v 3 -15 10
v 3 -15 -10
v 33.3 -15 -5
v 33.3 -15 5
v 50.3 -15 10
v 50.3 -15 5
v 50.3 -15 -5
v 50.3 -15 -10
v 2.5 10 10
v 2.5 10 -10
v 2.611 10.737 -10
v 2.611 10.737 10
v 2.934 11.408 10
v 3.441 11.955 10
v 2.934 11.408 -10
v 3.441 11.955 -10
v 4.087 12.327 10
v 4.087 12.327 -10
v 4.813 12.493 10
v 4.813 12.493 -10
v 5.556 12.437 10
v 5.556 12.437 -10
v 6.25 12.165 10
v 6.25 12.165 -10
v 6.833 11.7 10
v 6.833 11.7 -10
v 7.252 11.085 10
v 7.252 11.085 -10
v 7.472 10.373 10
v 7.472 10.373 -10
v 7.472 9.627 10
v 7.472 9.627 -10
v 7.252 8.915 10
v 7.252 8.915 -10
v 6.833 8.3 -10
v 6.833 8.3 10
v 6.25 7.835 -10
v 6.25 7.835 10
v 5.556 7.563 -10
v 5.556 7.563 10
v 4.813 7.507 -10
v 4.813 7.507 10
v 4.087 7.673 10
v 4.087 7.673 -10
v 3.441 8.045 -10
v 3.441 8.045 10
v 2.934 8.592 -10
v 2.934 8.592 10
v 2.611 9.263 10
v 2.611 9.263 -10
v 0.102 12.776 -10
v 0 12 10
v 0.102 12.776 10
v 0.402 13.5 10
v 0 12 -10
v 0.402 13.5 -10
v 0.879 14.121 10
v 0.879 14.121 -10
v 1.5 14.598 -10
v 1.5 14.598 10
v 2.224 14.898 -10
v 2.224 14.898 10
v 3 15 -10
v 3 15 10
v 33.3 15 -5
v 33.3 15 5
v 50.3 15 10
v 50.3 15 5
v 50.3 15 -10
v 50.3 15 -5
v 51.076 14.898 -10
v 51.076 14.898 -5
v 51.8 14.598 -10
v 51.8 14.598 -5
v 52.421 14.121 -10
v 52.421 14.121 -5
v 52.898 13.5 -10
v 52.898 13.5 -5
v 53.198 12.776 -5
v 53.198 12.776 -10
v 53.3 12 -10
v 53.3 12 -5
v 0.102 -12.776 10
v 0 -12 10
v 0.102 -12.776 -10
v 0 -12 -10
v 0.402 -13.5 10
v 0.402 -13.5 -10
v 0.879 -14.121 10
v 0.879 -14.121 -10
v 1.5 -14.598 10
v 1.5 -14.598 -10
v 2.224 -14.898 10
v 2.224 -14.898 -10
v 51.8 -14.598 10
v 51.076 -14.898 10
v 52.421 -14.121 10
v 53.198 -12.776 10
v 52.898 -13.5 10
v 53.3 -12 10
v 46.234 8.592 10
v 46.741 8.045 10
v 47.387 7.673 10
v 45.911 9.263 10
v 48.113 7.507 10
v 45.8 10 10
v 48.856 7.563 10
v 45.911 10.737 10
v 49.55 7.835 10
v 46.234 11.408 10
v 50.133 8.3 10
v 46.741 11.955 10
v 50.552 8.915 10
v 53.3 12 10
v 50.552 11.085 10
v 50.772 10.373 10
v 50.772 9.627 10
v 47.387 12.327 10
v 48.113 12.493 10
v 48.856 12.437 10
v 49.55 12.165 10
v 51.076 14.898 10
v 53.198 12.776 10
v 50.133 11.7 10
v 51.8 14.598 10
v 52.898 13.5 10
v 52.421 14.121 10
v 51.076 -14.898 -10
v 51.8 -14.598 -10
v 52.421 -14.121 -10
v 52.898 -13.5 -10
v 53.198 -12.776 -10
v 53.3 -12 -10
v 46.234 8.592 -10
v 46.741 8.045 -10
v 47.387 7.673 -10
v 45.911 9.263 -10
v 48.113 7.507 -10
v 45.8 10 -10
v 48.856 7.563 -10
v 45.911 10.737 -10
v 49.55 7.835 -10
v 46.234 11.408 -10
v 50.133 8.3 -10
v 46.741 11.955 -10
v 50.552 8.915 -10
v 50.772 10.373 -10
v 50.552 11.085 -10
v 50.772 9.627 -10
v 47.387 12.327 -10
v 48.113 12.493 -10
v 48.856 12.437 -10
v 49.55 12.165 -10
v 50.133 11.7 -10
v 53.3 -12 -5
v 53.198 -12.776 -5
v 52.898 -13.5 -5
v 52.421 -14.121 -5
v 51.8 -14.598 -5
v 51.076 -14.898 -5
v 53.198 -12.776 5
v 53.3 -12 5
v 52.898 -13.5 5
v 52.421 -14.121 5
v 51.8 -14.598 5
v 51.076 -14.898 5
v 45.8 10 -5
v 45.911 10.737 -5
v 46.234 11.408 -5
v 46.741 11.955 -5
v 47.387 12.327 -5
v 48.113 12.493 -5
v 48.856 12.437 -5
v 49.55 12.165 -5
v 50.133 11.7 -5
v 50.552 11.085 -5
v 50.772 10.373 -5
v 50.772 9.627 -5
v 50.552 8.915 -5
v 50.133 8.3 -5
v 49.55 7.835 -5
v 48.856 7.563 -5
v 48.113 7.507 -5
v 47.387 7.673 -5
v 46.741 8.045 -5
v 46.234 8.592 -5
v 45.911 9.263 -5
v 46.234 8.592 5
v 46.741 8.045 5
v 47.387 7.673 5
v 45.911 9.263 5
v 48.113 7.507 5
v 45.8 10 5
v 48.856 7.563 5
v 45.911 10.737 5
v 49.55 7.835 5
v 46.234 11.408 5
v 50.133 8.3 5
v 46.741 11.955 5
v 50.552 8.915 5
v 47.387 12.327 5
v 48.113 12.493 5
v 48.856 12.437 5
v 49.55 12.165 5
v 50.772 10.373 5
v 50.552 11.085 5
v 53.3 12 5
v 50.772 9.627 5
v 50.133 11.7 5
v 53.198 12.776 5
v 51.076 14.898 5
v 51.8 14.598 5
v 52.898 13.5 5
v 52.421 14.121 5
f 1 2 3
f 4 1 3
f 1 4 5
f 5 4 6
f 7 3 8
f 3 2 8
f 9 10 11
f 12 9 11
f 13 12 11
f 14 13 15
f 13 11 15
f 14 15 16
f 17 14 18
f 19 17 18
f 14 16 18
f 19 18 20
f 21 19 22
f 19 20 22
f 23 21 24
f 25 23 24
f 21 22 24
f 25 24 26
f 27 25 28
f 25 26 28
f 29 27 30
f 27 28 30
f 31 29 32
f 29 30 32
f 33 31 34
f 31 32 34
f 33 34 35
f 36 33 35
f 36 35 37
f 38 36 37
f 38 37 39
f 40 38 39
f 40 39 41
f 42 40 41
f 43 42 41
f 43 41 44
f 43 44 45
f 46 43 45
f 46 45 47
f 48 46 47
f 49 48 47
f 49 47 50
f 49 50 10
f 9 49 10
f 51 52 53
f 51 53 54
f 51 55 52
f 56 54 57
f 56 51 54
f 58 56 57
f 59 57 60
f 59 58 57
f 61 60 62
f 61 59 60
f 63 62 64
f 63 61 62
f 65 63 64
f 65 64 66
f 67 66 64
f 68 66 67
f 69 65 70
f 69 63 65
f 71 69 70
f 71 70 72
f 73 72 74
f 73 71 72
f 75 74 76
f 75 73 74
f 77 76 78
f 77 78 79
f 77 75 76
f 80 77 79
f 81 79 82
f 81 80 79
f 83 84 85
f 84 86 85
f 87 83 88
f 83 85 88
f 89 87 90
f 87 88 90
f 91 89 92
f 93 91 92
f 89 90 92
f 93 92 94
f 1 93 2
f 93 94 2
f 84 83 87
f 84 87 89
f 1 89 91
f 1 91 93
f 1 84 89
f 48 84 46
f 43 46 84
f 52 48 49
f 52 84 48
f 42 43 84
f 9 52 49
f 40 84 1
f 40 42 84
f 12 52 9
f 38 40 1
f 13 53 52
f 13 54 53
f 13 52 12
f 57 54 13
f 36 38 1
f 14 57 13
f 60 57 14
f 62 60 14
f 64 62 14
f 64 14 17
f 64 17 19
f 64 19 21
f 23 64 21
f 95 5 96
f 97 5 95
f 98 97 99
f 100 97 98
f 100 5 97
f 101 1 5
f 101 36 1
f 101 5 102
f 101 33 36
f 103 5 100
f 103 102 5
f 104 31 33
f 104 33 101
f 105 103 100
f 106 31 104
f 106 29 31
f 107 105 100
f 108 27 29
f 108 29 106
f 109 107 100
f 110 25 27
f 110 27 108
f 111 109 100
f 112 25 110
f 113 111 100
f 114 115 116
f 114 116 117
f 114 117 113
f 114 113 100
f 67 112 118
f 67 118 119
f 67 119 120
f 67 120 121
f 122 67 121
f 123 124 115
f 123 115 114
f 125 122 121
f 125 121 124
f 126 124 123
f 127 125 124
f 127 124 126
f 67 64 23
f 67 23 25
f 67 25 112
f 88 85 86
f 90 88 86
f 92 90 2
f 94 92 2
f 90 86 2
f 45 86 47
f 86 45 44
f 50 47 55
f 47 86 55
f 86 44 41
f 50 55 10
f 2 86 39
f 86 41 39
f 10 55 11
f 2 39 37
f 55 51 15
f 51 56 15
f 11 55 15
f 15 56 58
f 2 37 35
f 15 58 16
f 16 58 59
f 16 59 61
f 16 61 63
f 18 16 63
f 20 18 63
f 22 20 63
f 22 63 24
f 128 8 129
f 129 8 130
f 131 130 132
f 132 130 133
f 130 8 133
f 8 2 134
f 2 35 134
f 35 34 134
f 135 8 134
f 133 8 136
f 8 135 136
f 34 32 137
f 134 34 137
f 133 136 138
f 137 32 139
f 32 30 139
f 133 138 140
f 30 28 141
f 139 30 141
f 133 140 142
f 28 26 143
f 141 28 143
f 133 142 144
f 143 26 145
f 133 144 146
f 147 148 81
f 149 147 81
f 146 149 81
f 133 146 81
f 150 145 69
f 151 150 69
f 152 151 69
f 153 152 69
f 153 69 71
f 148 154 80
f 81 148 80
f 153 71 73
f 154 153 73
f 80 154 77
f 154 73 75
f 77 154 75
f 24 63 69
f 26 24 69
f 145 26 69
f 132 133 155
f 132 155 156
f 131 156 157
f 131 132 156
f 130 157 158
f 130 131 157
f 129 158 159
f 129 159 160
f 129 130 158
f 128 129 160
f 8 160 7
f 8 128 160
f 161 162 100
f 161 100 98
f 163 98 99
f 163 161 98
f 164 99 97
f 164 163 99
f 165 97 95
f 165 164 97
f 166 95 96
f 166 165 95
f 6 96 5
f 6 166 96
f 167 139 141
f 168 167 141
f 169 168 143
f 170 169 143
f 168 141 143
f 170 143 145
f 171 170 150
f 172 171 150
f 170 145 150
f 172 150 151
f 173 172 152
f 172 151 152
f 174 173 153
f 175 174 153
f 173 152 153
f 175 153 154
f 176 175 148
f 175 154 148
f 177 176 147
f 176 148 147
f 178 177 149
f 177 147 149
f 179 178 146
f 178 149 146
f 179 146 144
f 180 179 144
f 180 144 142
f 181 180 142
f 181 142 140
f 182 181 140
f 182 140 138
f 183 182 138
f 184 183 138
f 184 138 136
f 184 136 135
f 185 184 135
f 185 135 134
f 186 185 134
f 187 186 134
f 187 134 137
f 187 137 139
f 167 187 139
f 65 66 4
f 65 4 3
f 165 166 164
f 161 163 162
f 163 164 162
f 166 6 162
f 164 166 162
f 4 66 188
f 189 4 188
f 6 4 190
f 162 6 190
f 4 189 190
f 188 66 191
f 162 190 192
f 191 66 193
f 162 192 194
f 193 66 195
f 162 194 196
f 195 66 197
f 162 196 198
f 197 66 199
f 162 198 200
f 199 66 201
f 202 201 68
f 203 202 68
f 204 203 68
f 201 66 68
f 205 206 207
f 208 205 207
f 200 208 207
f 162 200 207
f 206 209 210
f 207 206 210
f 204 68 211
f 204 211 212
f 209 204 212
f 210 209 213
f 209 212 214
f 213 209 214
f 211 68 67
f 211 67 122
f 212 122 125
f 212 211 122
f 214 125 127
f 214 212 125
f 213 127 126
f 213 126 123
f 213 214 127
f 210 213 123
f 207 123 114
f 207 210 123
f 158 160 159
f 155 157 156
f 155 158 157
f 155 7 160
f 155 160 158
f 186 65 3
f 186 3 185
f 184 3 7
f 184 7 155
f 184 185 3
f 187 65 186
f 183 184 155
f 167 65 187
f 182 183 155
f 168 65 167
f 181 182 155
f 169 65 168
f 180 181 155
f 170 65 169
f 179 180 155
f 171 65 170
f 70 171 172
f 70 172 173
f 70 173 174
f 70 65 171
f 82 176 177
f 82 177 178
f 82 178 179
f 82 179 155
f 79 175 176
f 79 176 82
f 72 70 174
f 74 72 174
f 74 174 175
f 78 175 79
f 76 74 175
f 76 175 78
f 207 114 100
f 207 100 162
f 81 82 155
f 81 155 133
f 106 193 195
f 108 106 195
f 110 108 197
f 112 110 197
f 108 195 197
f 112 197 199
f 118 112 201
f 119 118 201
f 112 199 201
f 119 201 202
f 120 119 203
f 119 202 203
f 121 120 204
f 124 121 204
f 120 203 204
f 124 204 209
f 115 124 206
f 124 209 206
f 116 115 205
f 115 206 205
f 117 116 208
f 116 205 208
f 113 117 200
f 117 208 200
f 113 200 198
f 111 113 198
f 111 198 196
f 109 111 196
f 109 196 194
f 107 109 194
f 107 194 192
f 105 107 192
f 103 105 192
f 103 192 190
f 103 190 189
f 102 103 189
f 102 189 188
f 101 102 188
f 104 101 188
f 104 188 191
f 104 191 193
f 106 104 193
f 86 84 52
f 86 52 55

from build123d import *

# Parameters (mm, degrees)
ESQUISSE2_W             = 53.3
ESQUISSE2_H             = 20
BOSS_EXTRU_1_DEPTH      = 15
CONG_1_R                = 3
ESQUISSE4_W             = 20
ESQUISSE4_H             = 10
ENL_V_MAT_EXTRU_1_DEPTH = 31
ESQUISSE5_R             = 2.5
ENL_V_MAT_EXTRU_2_DEPTH = 21


with BuildPart() as part:
    # Esquisse2 → Boss.-Extru.1 (new body, symmetric)
    with BuildSketch(Plane(origin=(0, 0, 0), x_dir=(1, 0, 0), z_dir=(0, 1, 0))):
        with Locations((26.65, 0)):
            Rectangle(ESQUISSE2_W, ESQUISSE2_H)
    extrude(amount=BOSS_EXTRU_1_DEPTH, both=True)

    # Congé1
    cong_1_edges = [part.edges().sort_by_distance(p)[0] for p in [
        (53.3, 15, 0),
        (0, 15, 0),
        (53.3, -15, 0),
        (0, -15, 0),
    ]]
    fillet(cong_1_edges, radius=CONG_1_R)

    # Esquisse4 → Enlèv. mat.-Extru.1 (cut, through all)
    with BuildSketch(Plane(origin=(0, 15, 0), x_dir=(1, 0, 0), z_dir=(0, 1, 0))):
        with Locations((43.3, 0)):
            Rectangle(ESQUISSE4_W, ESQUISSE4_H)
    extrude(amount=-ENL_V_MAT_EXTRU_1_DEPTH, mode=Mode.SUBTRACT)

    # Esquisse5 → Enlèv. mat.-Extru.2 (cut, through all)
    with BuildSketch(Plane(origin=(0, 0, -10), x_dir=(-1, 0, 0), z_dir=(0, 0, -1))):
        with Locations((-48.3, 10)):
            Circle(ESQUISSE5_R)
        with Locations((-5, 10)):
            Circle(ESQUISSE5_R)
    extrude(amount=-ENL_V_MAT_EXTRU_2_DEPTH, mode=Mode.SUBTRACT)


solid = part.part
